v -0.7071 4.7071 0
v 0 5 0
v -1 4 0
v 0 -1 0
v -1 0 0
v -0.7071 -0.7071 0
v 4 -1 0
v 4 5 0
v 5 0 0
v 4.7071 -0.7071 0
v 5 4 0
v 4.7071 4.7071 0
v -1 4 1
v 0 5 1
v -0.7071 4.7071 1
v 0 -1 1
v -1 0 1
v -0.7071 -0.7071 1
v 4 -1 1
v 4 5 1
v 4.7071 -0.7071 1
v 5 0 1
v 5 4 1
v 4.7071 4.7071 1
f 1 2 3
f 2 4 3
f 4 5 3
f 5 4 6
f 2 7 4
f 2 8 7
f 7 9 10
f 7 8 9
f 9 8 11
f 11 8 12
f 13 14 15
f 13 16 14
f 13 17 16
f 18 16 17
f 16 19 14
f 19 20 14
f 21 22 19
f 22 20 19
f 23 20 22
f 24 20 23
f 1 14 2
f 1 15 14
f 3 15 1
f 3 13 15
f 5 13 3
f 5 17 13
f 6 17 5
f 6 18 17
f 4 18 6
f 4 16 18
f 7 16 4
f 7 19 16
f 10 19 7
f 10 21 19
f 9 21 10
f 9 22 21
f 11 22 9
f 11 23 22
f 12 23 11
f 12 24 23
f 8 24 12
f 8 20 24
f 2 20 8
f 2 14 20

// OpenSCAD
// 2D minkowski
linear_extrude(1) minkowski() {
  square(4);
  circle(1, $fn = 8);
}
